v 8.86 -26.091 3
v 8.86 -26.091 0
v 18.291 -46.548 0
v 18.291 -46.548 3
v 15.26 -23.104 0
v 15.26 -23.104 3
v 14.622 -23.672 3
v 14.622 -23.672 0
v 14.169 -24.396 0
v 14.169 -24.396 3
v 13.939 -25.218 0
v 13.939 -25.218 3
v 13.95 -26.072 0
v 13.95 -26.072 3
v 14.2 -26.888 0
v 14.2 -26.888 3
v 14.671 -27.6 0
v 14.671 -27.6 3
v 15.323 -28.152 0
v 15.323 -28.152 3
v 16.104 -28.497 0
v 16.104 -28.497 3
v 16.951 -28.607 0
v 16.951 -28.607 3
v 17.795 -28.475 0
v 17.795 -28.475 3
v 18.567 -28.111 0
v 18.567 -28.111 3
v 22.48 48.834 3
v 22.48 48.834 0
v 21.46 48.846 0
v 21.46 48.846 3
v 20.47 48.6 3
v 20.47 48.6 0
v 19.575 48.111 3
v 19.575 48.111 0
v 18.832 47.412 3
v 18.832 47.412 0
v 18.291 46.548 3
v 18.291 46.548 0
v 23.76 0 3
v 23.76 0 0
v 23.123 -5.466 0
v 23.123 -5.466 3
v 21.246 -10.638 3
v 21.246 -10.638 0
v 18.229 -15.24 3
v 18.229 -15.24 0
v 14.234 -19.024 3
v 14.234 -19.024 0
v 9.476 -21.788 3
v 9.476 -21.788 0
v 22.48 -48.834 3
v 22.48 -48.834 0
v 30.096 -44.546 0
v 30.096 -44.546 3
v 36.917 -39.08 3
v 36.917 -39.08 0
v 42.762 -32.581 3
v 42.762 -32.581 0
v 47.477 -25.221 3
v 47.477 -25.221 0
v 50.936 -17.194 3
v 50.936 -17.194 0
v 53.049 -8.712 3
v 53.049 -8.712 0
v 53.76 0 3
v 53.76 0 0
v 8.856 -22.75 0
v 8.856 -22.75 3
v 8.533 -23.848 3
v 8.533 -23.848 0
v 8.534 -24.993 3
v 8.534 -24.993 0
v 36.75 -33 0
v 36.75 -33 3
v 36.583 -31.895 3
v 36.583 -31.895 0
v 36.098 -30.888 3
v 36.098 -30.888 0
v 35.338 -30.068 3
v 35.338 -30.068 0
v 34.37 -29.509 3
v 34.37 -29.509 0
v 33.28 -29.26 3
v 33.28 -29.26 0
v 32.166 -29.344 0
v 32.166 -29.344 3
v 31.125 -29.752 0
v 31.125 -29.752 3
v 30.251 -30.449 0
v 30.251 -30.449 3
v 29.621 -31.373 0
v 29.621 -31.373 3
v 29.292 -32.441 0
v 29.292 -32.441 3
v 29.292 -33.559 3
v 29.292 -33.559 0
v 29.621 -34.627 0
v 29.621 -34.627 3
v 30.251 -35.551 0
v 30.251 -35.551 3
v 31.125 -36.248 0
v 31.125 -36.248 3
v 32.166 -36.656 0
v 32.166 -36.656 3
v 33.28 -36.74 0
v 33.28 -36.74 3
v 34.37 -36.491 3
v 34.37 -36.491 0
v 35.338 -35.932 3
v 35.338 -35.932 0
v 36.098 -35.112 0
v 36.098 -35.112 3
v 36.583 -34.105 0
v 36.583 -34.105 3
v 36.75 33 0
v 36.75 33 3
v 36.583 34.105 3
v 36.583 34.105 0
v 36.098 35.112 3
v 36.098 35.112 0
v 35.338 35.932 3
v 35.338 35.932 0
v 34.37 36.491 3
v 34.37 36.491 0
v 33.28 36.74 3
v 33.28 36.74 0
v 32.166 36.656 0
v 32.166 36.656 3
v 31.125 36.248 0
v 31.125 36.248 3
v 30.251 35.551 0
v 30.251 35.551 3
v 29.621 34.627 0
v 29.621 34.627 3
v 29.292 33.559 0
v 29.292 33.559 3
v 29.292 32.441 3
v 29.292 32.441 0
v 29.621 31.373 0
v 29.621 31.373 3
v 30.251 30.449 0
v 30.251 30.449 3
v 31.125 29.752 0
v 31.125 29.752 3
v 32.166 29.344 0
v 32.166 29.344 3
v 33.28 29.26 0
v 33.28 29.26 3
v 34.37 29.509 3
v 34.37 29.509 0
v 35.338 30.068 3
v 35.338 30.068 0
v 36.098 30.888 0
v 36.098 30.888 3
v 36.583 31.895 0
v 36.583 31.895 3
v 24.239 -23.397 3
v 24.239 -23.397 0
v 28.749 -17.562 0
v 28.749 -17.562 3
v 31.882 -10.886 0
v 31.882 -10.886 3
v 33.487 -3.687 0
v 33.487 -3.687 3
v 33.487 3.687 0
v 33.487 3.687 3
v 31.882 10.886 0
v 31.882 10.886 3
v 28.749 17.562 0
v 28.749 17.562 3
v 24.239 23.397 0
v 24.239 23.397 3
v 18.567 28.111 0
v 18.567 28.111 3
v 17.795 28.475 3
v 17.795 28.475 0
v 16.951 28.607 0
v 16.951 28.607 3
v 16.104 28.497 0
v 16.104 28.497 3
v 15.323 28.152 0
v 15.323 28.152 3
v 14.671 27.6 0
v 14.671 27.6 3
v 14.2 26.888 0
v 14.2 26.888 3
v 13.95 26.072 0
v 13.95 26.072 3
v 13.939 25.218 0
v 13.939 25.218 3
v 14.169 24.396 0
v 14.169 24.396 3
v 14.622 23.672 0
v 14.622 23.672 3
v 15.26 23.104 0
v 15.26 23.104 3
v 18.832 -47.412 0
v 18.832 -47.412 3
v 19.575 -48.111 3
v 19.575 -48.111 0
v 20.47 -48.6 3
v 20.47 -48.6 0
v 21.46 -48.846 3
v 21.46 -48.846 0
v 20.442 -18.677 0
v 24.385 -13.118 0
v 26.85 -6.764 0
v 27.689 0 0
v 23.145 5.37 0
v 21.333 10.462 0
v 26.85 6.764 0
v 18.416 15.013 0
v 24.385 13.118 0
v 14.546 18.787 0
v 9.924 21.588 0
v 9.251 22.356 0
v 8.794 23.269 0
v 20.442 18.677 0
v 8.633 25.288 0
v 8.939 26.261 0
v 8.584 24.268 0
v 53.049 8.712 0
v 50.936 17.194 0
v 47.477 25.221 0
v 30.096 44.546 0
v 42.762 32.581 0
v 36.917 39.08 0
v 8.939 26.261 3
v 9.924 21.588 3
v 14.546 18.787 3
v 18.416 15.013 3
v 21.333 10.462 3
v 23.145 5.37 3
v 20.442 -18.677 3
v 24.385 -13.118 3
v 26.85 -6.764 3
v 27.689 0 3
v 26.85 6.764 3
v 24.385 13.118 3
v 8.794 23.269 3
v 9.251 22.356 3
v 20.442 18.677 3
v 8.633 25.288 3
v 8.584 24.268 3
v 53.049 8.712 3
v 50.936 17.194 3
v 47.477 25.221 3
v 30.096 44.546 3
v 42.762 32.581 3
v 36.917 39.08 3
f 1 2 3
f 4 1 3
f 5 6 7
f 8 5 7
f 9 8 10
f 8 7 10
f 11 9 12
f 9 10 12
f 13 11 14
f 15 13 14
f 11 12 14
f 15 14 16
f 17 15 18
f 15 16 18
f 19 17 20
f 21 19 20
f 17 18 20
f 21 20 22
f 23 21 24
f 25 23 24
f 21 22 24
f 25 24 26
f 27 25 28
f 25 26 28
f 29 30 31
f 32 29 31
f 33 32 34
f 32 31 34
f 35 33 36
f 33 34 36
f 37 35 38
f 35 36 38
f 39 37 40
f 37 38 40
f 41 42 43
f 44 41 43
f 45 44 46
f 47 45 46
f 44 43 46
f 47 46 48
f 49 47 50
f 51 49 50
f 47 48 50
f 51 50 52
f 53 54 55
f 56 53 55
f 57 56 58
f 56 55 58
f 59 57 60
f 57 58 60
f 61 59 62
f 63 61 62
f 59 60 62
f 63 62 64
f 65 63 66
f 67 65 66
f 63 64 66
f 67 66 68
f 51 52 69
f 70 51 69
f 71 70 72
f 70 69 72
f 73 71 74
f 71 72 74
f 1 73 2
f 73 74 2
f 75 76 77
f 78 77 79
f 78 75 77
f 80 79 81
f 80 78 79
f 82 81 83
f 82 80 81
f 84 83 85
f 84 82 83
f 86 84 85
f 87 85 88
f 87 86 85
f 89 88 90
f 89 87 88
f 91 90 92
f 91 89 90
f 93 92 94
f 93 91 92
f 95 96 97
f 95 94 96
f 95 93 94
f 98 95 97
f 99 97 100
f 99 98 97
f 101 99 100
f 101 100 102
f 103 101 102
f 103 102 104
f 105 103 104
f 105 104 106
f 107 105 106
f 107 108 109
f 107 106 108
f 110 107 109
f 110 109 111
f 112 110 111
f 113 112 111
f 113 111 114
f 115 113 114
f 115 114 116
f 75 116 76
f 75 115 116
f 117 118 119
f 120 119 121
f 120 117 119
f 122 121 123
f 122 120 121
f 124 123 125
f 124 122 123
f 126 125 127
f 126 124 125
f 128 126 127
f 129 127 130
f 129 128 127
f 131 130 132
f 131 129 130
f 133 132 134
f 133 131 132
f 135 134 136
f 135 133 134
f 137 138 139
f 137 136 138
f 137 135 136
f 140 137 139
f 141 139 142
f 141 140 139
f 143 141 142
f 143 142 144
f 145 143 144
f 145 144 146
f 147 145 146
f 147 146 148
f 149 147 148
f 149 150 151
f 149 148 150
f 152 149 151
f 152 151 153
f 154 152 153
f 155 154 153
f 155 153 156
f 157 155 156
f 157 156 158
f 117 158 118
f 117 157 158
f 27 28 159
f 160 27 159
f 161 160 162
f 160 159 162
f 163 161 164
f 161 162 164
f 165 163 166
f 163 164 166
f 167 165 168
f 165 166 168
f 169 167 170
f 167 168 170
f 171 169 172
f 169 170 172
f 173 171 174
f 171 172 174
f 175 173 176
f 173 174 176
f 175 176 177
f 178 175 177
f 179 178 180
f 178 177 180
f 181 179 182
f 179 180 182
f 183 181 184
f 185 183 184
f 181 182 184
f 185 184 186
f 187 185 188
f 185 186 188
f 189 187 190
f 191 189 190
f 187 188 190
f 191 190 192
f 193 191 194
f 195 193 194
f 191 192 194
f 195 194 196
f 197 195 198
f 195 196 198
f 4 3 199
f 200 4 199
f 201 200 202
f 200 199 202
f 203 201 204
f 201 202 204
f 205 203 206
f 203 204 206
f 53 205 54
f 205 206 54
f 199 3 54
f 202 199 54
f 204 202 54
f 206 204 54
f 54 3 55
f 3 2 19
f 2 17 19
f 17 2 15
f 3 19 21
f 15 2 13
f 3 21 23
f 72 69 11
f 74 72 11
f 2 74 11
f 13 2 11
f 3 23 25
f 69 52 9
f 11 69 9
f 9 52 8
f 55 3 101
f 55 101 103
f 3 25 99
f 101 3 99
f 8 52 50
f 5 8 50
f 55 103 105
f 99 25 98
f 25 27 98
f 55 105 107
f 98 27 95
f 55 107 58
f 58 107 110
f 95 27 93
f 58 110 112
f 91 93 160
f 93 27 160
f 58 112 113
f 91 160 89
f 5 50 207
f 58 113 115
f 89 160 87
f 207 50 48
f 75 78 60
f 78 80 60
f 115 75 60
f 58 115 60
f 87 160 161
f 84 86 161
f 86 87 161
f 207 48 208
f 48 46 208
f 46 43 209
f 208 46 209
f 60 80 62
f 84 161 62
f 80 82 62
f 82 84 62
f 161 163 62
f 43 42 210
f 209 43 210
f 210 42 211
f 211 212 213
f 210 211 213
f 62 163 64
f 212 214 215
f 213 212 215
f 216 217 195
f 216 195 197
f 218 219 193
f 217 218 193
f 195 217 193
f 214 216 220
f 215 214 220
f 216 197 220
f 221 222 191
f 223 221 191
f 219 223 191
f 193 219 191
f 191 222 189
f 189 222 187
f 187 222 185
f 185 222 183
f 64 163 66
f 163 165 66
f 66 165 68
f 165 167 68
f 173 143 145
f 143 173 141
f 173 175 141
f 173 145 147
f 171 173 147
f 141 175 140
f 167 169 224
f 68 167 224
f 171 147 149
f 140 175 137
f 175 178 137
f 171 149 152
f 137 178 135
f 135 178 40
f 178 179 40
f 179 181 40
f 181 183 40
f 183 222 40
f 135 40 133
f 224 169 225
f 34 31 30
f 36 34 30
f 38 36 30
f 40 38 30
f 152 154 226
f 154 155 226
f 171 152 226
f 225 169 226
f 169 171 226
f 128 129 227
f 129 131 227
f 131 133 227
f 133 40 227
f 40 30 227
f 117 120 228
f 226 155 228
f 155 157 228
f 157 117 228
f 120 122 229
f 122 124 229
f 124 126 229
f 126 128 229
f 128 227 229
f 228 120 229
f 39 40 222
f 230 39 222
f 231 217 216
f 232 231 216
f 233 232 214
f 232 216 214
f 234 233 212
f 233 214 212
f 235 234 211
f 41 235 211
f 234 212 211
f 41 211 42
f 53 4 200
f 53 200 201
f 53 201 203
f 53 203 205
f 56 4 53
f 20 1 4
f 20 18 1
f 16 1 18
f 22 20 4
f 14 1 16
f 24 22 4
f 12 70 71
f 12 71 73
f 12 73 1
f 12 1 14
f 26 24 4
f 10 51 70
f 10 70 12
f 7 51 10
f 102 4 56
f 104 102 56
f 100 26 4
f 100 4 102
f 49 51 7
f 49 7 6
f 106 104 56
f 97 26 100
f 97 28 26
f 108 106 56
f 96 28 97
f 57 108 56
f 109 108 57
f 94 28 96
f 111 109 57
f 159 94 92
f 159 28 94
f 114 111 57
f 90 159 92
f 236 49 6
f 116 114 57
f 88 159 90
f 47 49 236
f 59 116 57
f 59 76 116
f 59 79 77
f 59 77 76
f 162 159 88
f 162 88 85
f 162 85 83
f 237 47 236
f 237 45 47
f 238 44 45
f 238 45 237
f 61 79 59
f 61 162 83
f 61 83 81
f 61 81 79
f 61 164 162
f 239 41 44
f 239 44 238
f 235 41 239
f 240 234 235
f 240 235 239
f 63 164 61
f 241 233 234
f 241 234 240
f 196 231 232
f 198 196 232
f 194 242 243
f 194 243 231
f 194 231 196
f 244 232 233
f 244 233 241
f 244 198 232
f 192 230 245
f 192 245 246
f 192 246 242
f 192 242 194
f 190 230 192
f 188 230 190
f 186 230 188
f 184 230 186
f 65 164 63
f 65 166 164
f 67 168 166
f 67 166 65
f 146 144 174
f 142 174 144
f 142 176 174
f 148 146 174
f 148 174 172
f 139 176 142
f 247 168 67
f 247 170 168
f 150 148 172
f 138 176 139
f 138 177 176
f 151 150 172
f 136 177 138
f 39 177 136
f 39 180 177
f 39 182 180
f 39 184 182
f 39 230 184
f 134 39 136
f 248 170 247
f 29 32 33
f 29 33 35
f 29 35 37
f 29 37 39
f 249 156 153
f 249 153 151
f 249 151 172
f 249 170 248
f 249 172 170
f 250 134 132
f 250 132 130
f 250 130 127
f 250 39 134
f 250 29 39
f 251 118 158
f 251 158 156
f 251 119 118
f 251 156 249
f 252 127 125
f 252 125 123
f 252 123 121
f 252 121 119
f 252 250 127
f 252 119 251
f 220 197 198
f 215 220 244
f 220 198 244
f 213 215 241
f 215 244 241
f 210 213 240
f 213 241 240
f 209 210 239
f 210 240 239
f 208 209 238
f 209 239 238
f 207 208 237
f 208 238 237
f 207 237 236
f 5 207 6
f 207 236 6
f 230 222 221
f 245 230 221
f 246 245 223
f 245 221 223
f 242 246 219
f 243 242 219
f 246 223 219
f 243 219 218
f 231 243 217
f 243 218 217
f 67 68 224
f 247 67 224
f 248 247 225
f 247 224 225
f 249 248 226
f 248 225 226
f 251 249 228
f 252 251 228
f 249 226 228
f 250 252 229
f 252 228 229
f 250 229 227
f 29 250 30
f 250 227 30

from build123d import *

# Parameters (mm, degrees)
F2_DEPTH = 3
F0_R     = 3.75
F3_DEPTH = 25
F5_DEPTH = 25


with BuildPart() as f2:
    # F1 (on Top) → F2 (new body)
    with BuildSketch(Plane.XY):
        with BuildLine():
            Line((18.290832, 46.547922), (8.93864, 26.261448))
            ThreePointArc((8.93864, 26.261448), (8.657222, 23.761775), (9.923681, 21.58838))
            ThreePointArc((9.923681, 21.58838), (20.004053, 12.8209), (23.76, 0))
            ThreePointArc((23.76, 0), (19.870822, -13.026435), (9.476497, -21.788382))
            ThreePointArc((9.476497, -21.788382), (8.532906, -23.848429), (8.859869, -26.090582))
            Line((8.859869, -26.090582), (18.290832, -46.547922))
            ThreePointArc((18.290832, -46.547922), (20.006943, -48.384291), (22.479731, -48.834407))
            ThreePointArc((22.479731, -48.834407), (45.26946, -28.996787), (53.76, 0))
            ThreePointArc((53.76, 0), (45.26946, 28.996787), (22.479731, 48.834407))
            ThreePointArc((22.479731, 48.834407), (20.006943, 48.384291), (18.290832, 46.547922))
        make_face()
    extrude(amount=F2_DEPTH)

    # F0 (on Top) → F3 (cut)
    with BuildSketch(Plane.XY):
        with Locations((33, 33)):
            Circle(F0_R)
        with Locations((33, -33)):
            Circle(F0_R)
    extrude(amount=F3_DEPTH, mode=Mode.SUBTRACT)

    # F4 (on face) → F5 (cut)
    with BuildSketch(Plane.XY.offset(3)):
        with BuildLine():
            ThreePointArc((18.566805, 28.110953), (14.410164, 27.261049), (15.260068, 23.104408))
            ThreePointArc((15.260068, 23.104408), (27.689048, 0), (15.260068, -23.104408))
            ThreePointArc((15.260068, -23.104408), (14.410164, -27.261049), (18.566805, -28.110953))
            ThreePointArc((18.566805, -28.110953), (33.689048, 0), (18.566805, 28.110953))
        make_face()
    extrude(amount=-F5_DEPTH, mode=Mode.SUBTRACT)


solid = f2.part
